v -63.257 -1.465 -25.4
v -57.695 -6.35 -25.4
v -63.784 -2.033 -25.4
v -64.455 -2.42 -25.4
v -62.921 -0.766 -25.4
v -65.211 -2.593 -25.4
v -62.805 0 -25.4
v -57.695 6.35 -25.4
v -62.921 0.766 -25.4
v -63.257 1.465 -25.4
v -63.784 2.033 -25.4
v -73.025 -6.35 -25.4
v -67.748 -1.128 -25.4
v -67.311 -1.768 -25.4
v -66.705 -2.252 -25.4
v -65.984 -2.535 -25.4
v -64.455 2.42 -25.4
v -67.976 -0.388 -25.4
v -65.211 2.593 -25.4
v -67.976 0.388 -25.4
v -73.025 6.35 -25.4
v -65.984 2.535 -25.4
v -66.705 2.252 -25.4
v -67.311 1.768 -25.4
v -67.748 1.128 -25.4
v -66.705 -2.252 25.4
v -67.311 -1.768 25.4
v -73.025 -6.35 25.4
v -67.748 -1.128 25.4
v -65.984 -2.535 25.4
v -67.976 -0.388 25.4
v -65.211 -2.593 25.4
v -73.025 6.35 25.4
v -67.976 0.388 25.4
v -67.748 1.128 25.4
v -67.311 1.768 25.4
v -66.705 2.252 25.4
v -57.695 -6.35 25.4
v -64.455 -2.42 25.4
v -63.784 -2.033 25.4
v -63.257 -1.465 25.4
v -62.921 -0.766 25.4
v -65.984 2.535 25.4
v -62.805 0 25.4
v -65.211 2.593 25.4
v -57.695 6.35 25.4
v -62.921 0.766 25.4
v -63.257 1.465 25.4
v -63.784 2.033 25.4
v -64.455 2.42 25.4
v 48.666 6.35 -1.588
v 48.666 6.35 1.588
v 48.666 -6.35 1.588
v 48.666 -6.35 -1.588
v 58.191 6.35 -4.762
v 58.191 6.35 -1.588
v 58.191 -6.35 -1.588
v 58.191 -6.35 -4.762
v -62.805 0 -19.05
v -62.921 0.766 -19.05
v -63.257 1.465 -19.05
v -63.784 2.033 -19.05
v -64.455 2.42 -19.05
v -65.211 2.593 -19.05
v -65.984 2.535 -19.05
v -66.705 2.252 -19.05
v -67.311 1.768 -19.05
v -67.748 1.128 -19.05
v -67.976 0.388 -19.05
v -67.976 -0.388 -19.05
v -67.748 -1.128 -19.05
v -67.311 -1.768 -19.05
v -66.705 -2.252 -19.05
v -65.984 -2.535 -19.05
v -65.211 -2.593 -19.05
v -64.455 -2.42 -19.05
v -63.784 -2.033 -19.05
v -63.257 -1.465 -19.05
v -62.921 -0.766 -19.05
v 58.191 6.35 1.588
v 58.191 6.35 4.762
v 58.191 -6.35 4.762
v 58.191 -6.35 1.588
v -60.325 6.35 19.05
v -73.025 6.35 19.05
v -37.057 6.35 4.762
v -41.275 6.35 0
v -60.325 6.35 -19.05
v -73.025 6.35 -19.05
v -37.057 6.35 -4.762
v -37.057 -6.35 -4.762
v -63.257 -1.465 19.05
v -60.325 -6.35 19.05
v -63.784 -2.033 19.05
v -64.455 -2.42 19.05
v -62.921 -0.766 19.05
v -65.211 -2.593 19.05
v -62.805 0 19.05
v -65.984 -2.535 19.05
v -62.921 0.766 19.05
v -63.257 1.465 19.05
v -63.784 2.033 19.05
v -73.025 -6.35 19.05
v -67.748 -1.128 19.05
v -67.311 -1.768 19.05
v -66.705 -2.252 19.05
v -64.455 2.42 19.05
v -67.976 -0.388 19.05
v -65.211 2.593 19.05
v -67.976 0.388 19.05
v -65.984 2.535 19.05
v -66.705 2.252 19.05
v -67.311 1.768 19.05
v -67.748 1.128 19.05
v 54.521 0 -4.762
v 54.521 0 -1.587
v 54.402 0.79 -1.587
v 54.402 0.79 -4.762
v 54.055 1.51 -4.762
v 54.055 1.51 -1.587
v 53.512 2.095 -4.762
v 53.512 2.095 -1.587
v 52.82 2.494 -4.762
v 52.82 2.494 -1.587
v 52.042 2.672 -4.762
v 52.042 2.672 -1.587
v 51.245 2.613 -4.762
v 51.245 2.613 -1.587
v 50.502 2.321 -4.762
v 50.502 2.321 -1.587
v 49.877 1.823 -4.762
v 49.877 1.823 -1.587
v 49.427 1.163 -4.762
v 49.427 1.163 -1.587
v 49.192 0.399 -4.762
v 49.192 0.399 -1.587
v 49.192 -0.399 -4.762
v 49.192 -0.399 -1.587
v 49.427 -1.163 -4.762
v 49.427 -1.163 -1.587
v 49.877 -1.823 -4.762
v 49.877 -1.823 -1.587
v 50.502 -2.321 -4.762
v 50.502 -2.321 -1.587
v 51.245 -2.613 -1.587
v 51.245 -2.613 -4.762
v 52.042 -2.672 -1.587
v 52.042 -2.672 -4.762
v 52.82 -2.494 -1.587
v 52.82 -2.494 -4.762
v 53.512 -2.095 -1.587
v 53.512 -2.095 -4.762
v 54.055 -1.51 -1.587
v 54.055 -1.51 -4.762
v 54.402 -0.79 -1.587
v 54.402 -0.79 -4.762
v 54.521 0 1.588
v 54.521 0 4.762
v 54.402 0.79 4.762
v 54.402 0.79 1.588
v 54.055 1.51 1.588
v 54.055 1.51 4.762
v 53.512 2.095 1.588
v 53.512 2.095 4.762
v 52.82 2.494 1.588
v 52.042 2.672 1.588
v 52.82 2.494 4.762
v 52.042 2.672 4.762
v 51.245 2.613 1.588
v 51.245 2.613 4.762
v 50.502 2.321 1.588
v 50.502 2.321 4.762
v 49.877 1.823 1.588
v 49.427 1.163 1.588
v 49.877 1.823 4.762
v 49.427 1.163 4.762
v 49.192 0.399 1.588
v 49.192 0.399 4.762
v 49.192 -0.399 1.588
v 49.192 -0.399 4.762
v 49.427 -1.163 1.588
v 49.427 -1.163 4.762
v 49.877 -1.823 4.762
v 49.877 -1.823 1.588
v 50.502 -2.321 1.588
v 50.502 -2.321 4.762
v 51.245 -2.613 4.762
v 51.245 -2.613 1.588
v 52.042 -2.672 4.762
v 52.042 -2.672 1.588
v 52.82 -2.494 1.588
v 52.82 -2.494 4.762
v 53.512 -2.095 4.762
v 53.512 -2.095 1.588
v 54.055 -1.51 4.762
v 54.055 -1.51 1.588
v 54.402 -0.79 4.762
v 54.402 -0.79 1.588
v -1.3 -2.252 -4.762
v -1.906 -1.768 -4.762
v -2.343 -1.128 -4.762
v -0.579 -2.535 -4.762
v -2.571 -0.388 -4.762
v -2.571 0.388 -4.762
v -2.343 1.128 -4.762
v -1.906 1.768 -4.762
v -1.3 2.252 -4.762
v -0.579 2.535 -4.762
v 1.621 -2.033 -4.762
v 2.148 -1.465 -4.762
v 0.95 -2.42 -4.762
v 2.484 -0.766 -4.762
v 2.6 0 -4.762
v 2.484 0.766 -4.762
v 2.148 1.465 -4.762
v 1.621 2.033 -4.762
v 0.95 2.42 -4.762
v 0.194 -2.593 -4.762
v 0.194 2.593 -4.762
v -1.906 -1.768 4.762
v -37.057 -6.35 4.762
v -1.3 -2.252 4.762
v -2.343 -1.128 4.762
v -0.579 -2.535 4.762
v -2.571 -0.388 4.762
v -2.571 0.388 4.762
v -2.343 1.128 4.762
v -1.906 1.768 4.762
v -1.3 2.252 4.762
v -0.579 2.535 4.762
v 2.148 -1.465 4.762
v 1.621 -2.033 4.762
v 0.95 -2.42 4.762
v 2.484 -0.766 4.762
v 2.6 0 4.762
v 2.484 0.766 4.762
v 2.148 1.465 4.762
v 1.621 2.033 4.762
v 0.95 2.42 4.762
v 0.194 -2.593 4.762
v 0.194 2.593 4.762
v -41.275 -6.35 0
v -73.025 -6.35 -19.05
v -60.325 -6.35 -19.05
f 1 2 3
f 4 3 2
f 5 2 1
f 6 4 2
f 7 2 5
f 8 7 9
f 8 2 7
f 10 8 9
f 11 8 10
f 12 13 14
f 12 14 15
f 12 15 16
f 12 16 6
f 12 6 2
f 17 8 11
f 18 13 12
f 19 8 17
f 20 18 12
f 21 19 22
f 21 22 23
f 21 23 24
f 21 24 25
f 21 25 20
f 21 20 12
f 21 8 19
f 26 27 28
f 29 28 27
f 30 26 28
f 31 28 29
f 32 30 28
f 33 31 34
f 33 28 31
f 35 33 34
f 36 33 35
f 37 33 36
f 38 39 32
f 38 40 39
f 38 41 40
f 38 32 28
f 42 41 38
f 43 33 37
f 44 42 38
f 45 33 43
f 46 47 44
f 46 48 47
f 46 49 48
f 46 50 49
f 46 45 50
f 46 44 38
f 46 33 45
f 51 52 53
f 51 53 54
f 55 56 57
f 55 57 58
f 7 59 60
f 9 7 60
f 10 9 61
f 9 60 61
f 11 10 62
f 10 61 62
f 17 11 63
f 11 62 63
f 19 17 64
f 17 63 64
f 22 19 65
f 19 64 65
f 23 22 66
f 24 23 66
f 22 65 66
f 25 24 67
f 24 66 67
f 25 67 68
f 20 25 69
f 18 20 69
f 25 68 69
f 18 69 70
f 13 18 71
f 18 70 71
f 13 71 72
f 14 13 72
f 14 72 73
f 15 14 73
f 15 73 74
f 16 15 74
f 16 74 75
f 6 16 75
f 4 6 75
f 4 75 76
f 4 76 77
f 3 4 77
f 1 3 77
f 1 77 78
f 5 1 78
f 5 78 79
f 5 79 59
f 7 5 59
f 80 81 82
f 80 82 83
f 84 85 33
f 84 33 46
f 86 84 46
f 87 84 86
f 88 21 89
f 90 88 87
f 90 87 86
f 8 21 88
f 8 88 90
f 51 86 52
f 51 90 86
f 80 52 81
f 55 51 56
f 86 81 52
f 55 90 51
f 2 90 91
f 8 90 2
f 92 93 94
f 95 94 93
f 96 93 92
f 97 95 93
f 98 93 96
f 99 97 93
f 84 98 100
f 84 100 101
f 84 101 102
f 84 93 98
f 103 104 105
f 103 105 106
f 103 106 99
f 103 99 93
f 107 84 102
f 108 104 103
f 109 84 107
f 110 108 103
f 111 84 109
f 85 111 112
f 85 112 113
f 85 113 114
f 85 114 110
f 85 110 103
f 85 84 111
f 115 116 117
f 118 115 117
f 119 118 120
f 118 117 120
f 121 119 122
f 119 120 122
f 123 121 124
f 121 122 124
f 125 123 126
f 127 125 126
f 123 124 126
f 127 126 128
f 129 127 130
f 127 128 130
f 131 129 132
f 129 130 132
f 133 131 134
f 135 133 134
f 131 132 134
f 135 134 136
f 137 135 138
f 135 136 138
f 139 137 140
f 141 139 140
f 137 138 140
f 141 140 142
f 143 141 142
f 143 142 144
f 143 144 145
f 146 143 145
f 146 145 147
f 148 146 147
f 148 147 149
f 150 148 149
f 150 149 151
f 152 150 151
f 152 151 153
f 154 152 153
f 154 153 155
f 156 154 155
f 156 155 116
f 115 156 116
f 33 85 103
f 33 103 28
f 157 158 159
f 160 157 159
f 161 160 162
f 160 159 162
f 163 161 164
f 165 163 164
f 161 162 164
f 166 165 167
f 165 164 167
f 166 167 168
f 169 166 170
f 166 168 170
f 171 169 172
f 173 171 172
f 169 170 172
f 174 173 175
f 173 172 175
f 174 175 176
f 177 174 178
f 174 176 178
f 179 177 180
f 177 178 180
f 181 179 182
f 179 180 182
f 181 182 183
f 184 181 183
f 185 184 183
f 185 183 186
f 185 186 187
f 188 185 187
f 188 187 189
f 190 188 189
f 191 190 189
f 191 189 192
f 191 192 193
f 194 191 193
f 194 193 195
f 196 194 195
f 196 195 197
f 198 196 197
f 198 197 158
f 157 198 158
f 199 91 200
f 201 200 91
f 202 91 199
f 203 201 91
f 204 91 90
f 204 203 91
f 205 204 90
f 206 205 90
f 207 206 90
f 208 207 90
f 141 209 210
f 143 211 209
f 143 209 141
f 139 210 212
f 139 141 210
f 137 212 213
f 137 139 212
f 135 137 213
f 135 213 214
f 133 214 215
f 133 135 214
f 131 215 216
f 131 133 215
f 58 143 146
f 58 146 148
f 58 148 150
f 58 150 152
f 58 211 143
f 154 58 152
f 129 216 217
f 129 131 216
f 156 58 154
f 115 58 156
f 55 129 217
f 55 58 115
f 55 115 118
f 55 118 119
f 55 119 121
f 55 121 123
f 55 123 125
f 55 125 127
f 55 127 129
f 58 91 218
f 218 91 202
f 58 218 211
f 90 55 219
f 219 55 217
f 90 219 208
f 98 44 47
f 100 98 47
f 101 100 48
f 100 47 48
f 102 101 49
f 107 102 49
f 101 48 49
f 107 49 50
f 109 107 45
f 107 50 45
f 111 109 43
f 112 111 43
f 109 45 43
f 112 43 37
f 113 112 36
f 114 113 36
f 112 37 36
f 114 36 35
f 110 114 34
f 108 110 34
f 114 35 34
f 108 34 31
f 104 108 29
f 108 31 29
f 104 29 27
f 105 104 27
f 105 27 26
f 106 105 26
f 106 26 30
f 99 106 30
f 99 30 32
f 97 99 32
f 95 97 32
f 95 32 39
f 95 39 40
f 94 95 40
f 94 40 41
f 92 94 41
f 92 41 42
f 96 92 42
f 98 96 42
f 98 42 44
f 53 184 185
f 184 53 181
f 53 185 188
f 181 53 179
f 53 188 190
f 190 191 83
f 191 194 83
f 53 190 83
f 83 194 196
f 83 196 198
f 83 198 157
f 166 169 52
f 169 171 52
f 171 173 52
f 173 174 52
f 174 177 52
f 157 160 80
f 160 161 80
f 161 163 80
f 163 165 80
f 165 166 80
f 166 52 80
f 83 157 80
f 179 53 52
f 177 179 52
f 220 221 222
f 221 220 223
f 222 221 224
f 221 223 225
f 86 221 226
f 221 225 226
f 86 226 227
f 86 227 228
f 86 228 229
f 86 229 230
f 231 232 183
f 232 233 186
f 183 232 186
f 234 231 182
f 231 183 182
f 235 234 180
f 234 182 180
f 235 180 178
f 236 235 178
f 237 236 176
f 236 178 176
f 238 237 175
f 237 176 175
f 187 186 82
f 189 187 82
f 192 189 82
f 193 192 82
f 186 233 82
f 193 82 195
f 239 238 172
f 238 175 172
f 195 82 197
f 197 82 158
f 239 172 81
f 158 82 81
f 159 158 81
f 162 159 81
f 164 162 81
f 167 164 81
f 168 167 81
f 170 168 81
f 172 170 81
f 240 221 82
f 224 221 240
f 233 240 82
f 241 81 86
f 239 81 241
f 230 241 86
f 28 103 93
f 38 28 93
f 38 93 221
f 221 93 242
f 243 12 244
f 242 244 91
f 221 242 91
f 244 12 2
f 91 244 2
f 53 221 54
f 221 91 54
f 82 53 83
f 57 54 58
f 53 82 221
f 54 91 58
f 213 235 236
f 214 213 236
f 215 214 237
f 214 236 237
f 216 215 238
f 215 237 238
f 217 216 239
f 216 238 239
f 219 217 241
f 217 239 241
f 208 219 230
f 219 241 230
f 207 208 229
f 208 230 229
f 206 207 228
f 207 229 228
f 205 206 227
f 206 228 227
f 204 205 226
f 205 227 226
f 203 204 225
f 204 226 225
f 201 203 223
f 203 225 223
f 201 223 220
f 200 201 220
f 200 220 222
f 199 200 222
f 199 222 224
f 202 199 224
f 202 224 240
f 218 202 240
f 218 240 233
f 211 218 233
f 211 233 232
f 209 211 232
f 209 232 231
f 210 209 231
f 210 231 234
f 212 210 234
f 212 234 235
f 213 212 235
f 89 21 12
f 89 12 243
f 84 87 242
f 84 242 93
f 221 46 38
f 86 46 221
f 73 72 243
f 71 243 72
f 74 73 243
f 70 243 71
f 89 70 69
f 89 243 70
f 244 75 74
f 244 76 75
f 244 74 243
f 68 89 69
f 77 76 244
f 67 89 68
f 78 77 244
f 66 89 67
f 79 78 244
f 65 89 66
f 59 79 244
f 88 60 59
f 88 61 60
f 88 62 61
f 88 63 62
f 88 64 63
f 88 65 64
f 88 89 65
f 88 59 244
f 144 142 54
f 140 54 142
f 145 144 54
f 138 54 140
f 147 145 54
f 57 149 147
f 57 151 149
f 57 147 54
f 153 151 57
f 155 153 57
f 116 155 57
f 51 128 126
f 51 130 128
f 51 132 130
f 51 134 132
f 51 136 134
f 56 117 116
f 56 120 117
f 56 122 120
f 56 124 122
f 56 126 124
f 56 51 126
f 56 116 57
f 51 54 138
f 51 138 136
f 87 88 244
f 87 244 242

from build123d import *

# Parameters (mm, degrees)
ESQUISSE1_W             = 12.7
ESQUISSE1_H             = 12.7
BOSS_EXTRU_1_DEPTH      = 4.7625
ESQUISSE2_R             = 2.6
ENL_V_MAT_EXTRU_1_DEPTH = 14.090860361
ESQUISSE4_W             = 9.525
ESQUISSE4_H             = 12.7
BOSS_EXTRU_3_DEPTH      = 51.8414
ESQUISSE5_R             = 2.6797
ENL_V_MAT_EXTRU_2_DEPTH = 60.306721027
ESQUISSE6_W             = 9.525
ESQUISSE6_H             = 3.175
ENL_V_MAT_EXTRU_3_DEPTH = 60.751237981
ESQUISSE7_W             = 9.525
ESQUISSE7_H             = 12.7
BOSS_EXTRU_4_DEPTH      = 34.925
BOSS_EXTRU_5_DEPTH      = 12.7
ESQUISSE9_R             = 2.6
ENL_V_MAT_EXTRU_4_DEPTH = 90.183031598


with BuildPart() as part:
    # Esquisse1 → Boss.-Extru.1 (new, symmetric)
    with BuildSketch(Plane.XY):
        Rectangle(ESQUISSE1_W, ESQUISSE1_H)
    extrude(amount=BOSS_EXTRU_1_DEPTH, both=True)

    # Esquisse2 → Enlèv. mat.-Extru.1 (cut, through all)
    with BuildSketch(Plane.XY.offset(4.7625)):
        Circle(ESQUISSE2_R)
    extrude(amount=-ENL_V_MAT_EXTRU_1_DEPTH, mode=Mode.SUBTRACT)

    # Esquisse4 → Boss.-Extru.3 (add)
    with BuildSketch(Plane(origin=(6.35, 0, 0), x_dir=(0, 0, -1), z_dir=(1, 0, 0))):
        Rectangle(ESQUISSE4_W, ESQUISSE4_H)
    extrude(amount=BOSS_EXTRU_3_DEPTH)

    # Esquisse5 → Enlèv. mat.-Extru.2 (cut, through all)
    with BuildSketch(Plane.XY.offset(4.7625)):
        with Locations((51.8414, 0)):
            Circle(ESQUISSE5_R)
    extrude(amount=-ENL_V_MAT_EXTRU_2_DEPTH, mode=Mode.SUBTRACT)

    # Esquisse6 → Enlèv. mat.-Extru.3 (cut, through all)
    with BuildSketch(Plane(origin=(0, 6.35, 0), x_dir=(1, 0, 0), z_dir=(0, 1, 0))):
        with Locations((53.4289, 0)):
            Rectangle(ESQUISSE6_W, ESQUISSE6_H)
    extrude(amount=-ENL_V_MAT_EXTRU_3_DEPTH, mode=Mode.SUBTRACT)

    # Esquisse7 → Boss.-Extru.4 (add)
    with BuildSketch(Plane.ZY.offset(6.35)):
        Rectangle(ESQUISSE7_W, ESQUISSE7_H)
    extrude(amount=BOSS_EXTRU_4_DEPTH)

    # Esquisse8 → Boss.-Extru.5 (add)
    with BuildSketch(Plane(origin=(0, 6.35, 0), x_dir=(1, 0, 0), z_dir=(0, 1, 0))):
        Polygon((-37.057243879, 4.7625), (-57.694743879, 25.4), (-73.025, 25.4), (-73.025, 19.05), (-60.325, 19.05), (-41.275, 0), (-60.325, -19.05), (-73.025, -19.05), (-73.025, -25.4), (-57.694743879, -25.4), (-37.057243879, -4.7625), align=None)
    extrude(amount=-BOSS_EXTRU_5_DEPTH)

    # Esquisse9 → Enlèv. mat.-Extru.4 (cut, through all)
    with BuildSketch(Plane.XY.offset(25.4)):
        with Locations((-65.405, 0)):
            Circle(ESQUISSE9_R)
    extrude(amount=-ENL_V_MAT_EXTRU_4_DEPTH, mode=Mode.SUBTRACT)


solid = part.part
